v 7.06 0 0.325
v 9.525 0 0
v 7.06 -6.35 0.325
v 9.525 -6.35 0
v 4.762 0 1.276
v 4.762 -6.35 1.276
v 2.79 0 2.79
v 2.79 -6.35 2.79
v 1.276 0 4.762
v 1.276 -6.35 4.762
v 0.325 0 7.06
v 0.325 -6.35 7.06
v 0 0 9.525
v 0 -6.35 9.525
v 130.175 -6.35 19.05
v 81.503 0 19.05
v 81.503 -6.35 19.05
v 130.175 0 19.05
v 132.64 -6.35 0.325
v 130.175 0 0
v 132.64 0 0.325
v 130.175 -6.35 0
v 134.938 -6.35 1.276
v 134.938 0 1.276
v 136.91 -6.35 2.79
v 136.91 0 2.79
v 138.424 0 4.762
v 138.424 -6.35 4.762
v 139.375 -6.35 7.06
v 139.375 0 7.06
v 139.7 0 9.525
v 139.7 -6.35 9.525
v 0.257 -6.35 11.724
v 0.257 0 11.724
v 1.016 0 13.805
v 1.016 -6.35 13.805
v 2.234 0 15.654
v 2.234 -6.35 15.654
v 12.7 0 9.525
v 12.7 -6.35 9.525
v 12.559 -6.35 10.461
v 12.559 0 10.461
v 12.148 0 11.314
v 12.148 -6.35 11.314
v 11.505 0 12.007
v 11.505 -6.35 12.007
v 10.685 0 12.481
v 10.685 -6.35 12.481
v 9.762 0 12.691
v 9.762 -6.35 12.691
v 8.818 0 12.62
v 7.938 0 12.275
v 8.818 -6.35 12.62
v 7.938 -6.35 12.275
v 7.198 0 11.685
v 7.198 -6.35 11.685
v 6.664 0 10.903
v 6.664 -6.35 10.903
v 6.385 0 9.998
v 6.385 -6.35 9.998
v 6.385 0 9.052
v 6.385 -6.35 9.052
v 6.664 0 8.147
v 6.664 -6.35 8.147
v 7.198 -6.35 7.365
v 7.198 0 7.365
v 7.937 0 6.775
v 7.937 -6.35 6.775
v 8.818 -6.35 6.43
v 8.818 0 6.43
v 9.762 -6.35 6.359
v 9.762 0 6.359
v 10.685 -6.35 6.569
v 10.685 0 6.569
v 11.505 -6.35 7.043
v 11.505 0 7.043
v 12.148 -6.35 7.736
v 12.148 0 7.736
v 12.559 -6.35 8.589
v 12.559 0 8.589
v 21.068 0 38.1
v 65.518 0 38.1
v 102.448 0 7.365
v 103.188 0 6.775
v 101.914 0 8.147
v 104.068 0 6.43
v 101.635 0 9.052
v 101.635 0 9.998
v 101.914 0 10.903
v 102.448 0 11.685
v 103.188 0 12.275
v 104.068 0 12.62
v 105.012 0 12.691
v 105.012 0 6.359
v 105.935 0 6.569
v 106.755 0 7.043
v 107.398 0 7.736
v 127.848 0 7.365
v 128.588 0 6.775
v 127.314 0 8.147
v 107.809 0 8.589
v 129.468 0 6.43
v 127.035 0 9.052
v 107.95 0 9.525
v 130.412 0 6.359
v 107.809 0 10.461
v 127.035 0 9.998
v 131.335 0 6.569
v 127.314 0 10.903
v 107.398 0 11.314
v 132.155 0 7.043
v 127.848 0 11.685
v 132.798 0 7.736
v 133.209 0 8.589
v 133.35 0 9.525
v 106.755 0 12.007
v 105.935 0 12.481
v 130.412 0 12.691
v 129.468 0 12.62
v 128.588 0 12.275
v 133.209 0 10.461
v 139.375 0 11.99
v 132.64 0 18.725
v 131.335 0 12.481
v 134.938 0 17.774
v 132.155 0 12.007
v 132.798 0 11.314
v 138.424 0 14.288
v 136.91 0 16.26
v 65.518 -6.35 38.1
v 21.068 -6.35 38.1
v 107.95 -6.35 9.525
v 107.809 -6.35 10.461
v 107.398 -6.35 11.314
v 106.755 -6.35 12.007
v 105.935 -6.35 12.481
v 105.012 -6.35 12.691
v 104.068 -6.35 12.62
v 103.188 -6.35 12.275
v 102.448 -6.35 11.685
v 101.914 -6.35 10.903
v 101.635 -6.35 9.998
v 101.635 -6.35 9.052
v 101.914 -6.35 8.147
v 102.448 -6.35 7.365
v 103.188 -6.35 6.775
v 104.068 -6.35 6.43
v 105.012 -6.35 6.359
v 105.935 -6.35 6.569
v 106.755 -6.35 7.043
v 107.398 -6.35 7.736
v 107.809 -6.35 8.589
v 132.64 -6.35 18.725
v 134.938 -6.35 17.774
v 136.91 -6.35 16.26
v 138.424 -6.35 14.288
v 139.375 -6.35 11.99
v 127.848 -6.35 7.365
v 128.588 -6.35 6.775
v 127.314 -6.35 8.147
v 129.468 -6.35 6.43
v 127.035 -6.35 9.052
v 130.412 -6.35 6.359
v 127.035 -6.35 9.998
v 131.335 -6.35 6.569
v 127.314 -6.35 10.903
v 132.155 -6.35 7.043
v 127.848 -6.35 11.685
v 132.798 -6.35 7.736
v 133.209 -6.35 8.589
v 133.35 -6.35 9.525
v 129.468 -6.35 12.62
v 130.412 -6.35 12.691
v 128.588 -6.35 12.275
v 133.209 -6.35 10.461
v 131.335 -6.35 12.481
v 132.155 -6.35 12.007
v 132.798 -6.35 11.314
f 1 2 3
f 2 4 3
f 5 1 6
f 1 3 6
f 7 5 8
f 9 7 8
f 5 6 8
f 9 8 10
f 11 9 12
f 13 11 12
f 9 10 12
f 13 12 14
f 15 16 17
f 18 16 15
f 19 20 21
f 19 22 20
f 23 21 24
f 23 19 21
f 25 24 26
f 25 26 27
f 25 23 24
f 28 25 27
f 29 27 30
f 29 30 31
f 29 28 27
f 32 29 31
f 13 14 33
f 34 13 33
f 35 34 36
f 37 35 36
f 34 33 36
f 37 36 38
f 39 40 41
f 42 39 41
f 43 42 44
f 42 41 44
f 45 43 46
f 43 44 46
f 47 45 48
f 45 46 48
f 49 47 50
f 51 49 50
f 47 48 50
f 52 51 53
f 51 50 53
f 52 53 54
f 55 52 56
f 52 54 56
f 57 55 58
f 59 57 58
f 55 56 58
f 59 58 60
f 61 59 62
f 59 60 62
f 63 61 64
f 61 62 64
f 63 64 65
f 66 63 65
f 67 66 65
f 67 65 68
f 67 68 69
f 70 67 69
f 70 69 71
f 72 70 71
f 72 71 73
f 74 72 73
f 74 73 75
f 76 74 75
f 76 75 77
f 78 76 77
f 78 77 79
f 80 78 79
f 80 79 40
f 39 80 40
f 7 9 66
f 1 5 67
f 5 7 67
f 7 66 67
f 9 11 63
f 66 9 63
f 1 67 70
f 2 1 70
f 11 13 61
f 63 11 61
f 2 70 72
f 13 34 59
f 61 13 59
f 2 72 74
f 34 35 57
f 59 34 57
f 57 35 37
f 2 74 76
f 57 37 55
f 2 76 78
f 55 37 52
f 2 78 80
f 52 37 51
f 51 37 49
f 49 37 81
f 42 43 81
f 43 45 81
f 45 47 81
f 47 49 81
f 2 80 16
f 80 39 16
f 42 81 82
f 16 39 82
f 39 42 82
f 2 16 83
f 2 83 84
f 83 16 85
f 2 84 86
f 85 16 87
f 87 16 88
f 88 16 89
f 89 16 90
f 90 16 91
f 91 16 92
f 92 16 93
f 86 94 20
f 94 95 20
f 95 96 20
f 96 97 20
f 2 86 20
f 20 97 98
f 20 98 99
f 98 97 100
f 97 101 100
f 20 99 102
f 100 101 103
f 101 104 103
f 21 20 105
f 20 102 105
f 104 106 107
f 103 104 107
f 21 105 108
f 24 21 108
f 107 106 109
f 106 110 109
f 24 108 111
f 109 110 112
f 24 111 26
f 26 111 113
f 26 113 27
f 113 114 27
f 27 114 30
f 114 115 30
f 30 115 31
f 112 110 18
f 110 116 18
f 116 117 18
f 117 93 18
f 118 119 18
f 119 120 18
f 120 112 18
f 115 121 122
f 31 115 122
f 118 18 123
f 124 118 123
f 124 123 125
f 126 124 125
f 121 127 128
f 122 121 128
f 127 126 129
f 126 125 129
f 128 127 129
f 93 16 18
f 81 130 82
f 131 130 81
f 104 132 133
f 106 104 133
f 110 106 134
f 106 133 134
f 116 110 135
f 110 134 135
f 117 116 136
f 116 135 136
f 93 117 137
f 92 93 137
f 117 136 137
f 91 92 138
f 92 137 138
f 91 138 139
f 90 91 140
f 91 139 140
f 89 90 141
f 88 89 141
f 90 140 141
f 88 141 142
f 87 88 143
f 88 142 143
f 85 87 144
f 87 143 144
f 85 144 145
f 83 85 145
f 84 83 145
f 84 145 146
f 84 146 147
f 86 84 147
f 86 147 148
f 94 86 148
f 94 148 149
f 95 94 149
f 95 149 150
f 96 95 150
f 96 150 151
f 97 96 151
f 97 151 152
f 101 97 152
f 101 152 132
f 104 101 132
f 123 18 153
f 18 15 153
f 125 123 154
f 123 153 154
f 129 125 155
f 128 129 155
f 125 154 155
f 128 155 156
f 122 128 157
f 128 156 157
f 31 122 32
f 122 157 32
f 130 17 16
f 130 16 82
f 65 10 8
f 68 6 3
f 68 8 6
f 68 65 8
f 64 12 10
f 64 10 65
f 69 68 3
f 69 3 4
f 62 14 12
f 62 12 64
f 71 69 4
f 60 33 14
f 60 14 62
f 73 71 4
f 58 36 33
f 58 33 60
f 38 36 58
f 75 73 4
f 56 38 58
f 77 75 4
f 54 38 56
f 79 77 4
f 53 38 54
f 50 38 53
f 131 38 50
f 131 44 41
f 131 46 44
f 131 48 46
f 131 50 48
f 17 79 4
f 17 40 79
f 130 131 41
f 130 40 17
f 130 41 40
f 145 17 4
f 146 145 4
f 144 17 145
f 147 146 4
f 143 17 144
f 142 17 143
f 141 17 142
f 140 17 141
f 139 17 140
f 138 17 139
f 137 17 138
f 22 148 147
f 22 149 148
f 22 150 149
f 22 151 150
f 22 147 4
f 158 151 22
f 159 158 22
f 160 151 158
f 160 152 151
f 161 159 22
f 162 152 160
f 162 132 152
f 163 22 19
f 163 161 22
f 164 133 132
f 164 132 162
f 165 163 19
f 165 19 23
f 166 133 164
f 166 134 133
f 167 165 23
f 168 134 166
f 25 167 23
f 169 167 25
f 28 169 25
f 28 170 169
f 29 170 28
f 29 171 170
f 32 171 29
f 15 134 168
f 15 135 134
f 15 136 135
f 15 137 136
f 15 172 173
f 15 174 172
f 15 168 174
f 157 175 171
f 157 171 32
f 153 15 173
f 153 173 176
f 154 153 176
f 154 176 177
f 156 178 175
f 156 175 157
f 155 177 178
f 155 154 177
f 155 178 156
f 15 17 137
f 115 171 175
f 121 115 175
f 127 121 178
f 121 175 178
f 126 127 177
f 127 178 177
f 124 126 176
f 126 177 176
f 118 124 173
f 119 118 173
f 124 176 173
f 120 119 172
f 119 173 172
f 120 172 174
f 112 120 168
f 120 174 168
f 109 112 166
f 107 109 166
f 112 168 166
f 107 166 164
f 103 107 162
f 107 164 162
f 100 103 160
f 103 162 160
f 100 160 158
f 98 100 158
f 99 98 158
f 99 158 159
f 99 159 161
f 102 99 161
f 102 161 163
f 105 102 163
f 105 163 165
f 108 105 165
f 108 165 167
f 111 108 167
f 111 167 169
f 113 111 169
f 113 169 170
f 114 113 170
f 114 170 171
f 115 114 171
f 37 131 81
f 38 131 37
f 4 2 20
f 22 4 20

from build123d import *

# Parameters (mm, degrees)
F0_W      = 139.7
F0_H      = 19.05
F1_DEPTH  = 6.35
F2_R      = 3.175
F3_DEPTH  = 6.351
F4_R      = 3.175
F5_DEPTH  = 25.4
F6_R      = 9.52499
F7_R      = 9.52499
F8_R      = 3.175
F9_DEPTH  = 6.351
F11_DEPTH = 6.35


# Not quite as in the source:
# - a fillet or chamfer is up to 0.001 mm smaller than in the source, because OpenCascade refuses the exact size


with BuildPart() as f1:
    # F0 (on Front) → F1 (new body)
    with BuildSketch(Plane.XZ):
        with Locations((69.85, 9.525)):
            Rectangle(F0_W, F0_H)
    extrude(amount=F1_DEPTH)

    # F2 (on face) → F3 (cut, through all)
    with BuildSketch(Plane.XZ.offset(6.35)):
        with Locations((130.175, 9.525)):
            Circle(F2_R)
    extrude(amount=-F3_DEPTH, mode=Mode.SUBTRACT)

    # F4 (on face) → F5 (cut)
    with BuildSketch(Plane.XZ.offset(6.35)):
        with Locations((104.775, 9.525)):
            Circle(F4_R)
    extrude(amount=-F5_DEPTH, mode=Mode.SUBTRACT)

    # F6 (radius 9.525 in the source; OpenCascade refuses exactly that, so slightly less here)
    f6_edges = [f1.edges().sort_by_distance(p)[0] for p in [
        (139.7, -3.175, 19.05),
        (139.7, -3.175, 0),
    ]]
    fillet(f6_edges, radius=F6_R)

    # F7 (radius 9.525 in the source; OpenCascade refuses exactly that, so slightly less here)
    f7_edges = [f1.edges().sort_by_distance(p)[0] for p in [
        (0, -3.175, 19.05),
        (0, -3.175, 0),
    ]]
    fillet(f7_edges, radius=F7_R)

    # F8 (on face) → F9 (cut, through all)
    with BuildSketch(Plane.XZ.offset(6.35)):
        with Locations((9.525, 9.525)):
            Circle(F8_R)
    extrude(amount=-F9_DEPTH, mode=Mode.SUBTRACT)

    # F10 (on face) → F11 (join)
    with BuildSketch(Plane.XZ.offset(6.35)):
        with BuildLine():
            Line((21.06826753, 38.1), (2.2284266793, 15.6475519823))
            ThreePointArc((2.2284266793, 15.6475519823), (5.4995610569, 18.1575816715), (9.525, 19.05))
            Line((9.525, 19.05), (81.5031155039, 19.05))
            Line((81.5031155039, 19.05), (65.51826753, 38.1))
            Line((65.51826753, 38.1), (21.06826753, 38.1))
        make_face()
    extrude(amount=-F11_DEPTH)


solid = f1.part
